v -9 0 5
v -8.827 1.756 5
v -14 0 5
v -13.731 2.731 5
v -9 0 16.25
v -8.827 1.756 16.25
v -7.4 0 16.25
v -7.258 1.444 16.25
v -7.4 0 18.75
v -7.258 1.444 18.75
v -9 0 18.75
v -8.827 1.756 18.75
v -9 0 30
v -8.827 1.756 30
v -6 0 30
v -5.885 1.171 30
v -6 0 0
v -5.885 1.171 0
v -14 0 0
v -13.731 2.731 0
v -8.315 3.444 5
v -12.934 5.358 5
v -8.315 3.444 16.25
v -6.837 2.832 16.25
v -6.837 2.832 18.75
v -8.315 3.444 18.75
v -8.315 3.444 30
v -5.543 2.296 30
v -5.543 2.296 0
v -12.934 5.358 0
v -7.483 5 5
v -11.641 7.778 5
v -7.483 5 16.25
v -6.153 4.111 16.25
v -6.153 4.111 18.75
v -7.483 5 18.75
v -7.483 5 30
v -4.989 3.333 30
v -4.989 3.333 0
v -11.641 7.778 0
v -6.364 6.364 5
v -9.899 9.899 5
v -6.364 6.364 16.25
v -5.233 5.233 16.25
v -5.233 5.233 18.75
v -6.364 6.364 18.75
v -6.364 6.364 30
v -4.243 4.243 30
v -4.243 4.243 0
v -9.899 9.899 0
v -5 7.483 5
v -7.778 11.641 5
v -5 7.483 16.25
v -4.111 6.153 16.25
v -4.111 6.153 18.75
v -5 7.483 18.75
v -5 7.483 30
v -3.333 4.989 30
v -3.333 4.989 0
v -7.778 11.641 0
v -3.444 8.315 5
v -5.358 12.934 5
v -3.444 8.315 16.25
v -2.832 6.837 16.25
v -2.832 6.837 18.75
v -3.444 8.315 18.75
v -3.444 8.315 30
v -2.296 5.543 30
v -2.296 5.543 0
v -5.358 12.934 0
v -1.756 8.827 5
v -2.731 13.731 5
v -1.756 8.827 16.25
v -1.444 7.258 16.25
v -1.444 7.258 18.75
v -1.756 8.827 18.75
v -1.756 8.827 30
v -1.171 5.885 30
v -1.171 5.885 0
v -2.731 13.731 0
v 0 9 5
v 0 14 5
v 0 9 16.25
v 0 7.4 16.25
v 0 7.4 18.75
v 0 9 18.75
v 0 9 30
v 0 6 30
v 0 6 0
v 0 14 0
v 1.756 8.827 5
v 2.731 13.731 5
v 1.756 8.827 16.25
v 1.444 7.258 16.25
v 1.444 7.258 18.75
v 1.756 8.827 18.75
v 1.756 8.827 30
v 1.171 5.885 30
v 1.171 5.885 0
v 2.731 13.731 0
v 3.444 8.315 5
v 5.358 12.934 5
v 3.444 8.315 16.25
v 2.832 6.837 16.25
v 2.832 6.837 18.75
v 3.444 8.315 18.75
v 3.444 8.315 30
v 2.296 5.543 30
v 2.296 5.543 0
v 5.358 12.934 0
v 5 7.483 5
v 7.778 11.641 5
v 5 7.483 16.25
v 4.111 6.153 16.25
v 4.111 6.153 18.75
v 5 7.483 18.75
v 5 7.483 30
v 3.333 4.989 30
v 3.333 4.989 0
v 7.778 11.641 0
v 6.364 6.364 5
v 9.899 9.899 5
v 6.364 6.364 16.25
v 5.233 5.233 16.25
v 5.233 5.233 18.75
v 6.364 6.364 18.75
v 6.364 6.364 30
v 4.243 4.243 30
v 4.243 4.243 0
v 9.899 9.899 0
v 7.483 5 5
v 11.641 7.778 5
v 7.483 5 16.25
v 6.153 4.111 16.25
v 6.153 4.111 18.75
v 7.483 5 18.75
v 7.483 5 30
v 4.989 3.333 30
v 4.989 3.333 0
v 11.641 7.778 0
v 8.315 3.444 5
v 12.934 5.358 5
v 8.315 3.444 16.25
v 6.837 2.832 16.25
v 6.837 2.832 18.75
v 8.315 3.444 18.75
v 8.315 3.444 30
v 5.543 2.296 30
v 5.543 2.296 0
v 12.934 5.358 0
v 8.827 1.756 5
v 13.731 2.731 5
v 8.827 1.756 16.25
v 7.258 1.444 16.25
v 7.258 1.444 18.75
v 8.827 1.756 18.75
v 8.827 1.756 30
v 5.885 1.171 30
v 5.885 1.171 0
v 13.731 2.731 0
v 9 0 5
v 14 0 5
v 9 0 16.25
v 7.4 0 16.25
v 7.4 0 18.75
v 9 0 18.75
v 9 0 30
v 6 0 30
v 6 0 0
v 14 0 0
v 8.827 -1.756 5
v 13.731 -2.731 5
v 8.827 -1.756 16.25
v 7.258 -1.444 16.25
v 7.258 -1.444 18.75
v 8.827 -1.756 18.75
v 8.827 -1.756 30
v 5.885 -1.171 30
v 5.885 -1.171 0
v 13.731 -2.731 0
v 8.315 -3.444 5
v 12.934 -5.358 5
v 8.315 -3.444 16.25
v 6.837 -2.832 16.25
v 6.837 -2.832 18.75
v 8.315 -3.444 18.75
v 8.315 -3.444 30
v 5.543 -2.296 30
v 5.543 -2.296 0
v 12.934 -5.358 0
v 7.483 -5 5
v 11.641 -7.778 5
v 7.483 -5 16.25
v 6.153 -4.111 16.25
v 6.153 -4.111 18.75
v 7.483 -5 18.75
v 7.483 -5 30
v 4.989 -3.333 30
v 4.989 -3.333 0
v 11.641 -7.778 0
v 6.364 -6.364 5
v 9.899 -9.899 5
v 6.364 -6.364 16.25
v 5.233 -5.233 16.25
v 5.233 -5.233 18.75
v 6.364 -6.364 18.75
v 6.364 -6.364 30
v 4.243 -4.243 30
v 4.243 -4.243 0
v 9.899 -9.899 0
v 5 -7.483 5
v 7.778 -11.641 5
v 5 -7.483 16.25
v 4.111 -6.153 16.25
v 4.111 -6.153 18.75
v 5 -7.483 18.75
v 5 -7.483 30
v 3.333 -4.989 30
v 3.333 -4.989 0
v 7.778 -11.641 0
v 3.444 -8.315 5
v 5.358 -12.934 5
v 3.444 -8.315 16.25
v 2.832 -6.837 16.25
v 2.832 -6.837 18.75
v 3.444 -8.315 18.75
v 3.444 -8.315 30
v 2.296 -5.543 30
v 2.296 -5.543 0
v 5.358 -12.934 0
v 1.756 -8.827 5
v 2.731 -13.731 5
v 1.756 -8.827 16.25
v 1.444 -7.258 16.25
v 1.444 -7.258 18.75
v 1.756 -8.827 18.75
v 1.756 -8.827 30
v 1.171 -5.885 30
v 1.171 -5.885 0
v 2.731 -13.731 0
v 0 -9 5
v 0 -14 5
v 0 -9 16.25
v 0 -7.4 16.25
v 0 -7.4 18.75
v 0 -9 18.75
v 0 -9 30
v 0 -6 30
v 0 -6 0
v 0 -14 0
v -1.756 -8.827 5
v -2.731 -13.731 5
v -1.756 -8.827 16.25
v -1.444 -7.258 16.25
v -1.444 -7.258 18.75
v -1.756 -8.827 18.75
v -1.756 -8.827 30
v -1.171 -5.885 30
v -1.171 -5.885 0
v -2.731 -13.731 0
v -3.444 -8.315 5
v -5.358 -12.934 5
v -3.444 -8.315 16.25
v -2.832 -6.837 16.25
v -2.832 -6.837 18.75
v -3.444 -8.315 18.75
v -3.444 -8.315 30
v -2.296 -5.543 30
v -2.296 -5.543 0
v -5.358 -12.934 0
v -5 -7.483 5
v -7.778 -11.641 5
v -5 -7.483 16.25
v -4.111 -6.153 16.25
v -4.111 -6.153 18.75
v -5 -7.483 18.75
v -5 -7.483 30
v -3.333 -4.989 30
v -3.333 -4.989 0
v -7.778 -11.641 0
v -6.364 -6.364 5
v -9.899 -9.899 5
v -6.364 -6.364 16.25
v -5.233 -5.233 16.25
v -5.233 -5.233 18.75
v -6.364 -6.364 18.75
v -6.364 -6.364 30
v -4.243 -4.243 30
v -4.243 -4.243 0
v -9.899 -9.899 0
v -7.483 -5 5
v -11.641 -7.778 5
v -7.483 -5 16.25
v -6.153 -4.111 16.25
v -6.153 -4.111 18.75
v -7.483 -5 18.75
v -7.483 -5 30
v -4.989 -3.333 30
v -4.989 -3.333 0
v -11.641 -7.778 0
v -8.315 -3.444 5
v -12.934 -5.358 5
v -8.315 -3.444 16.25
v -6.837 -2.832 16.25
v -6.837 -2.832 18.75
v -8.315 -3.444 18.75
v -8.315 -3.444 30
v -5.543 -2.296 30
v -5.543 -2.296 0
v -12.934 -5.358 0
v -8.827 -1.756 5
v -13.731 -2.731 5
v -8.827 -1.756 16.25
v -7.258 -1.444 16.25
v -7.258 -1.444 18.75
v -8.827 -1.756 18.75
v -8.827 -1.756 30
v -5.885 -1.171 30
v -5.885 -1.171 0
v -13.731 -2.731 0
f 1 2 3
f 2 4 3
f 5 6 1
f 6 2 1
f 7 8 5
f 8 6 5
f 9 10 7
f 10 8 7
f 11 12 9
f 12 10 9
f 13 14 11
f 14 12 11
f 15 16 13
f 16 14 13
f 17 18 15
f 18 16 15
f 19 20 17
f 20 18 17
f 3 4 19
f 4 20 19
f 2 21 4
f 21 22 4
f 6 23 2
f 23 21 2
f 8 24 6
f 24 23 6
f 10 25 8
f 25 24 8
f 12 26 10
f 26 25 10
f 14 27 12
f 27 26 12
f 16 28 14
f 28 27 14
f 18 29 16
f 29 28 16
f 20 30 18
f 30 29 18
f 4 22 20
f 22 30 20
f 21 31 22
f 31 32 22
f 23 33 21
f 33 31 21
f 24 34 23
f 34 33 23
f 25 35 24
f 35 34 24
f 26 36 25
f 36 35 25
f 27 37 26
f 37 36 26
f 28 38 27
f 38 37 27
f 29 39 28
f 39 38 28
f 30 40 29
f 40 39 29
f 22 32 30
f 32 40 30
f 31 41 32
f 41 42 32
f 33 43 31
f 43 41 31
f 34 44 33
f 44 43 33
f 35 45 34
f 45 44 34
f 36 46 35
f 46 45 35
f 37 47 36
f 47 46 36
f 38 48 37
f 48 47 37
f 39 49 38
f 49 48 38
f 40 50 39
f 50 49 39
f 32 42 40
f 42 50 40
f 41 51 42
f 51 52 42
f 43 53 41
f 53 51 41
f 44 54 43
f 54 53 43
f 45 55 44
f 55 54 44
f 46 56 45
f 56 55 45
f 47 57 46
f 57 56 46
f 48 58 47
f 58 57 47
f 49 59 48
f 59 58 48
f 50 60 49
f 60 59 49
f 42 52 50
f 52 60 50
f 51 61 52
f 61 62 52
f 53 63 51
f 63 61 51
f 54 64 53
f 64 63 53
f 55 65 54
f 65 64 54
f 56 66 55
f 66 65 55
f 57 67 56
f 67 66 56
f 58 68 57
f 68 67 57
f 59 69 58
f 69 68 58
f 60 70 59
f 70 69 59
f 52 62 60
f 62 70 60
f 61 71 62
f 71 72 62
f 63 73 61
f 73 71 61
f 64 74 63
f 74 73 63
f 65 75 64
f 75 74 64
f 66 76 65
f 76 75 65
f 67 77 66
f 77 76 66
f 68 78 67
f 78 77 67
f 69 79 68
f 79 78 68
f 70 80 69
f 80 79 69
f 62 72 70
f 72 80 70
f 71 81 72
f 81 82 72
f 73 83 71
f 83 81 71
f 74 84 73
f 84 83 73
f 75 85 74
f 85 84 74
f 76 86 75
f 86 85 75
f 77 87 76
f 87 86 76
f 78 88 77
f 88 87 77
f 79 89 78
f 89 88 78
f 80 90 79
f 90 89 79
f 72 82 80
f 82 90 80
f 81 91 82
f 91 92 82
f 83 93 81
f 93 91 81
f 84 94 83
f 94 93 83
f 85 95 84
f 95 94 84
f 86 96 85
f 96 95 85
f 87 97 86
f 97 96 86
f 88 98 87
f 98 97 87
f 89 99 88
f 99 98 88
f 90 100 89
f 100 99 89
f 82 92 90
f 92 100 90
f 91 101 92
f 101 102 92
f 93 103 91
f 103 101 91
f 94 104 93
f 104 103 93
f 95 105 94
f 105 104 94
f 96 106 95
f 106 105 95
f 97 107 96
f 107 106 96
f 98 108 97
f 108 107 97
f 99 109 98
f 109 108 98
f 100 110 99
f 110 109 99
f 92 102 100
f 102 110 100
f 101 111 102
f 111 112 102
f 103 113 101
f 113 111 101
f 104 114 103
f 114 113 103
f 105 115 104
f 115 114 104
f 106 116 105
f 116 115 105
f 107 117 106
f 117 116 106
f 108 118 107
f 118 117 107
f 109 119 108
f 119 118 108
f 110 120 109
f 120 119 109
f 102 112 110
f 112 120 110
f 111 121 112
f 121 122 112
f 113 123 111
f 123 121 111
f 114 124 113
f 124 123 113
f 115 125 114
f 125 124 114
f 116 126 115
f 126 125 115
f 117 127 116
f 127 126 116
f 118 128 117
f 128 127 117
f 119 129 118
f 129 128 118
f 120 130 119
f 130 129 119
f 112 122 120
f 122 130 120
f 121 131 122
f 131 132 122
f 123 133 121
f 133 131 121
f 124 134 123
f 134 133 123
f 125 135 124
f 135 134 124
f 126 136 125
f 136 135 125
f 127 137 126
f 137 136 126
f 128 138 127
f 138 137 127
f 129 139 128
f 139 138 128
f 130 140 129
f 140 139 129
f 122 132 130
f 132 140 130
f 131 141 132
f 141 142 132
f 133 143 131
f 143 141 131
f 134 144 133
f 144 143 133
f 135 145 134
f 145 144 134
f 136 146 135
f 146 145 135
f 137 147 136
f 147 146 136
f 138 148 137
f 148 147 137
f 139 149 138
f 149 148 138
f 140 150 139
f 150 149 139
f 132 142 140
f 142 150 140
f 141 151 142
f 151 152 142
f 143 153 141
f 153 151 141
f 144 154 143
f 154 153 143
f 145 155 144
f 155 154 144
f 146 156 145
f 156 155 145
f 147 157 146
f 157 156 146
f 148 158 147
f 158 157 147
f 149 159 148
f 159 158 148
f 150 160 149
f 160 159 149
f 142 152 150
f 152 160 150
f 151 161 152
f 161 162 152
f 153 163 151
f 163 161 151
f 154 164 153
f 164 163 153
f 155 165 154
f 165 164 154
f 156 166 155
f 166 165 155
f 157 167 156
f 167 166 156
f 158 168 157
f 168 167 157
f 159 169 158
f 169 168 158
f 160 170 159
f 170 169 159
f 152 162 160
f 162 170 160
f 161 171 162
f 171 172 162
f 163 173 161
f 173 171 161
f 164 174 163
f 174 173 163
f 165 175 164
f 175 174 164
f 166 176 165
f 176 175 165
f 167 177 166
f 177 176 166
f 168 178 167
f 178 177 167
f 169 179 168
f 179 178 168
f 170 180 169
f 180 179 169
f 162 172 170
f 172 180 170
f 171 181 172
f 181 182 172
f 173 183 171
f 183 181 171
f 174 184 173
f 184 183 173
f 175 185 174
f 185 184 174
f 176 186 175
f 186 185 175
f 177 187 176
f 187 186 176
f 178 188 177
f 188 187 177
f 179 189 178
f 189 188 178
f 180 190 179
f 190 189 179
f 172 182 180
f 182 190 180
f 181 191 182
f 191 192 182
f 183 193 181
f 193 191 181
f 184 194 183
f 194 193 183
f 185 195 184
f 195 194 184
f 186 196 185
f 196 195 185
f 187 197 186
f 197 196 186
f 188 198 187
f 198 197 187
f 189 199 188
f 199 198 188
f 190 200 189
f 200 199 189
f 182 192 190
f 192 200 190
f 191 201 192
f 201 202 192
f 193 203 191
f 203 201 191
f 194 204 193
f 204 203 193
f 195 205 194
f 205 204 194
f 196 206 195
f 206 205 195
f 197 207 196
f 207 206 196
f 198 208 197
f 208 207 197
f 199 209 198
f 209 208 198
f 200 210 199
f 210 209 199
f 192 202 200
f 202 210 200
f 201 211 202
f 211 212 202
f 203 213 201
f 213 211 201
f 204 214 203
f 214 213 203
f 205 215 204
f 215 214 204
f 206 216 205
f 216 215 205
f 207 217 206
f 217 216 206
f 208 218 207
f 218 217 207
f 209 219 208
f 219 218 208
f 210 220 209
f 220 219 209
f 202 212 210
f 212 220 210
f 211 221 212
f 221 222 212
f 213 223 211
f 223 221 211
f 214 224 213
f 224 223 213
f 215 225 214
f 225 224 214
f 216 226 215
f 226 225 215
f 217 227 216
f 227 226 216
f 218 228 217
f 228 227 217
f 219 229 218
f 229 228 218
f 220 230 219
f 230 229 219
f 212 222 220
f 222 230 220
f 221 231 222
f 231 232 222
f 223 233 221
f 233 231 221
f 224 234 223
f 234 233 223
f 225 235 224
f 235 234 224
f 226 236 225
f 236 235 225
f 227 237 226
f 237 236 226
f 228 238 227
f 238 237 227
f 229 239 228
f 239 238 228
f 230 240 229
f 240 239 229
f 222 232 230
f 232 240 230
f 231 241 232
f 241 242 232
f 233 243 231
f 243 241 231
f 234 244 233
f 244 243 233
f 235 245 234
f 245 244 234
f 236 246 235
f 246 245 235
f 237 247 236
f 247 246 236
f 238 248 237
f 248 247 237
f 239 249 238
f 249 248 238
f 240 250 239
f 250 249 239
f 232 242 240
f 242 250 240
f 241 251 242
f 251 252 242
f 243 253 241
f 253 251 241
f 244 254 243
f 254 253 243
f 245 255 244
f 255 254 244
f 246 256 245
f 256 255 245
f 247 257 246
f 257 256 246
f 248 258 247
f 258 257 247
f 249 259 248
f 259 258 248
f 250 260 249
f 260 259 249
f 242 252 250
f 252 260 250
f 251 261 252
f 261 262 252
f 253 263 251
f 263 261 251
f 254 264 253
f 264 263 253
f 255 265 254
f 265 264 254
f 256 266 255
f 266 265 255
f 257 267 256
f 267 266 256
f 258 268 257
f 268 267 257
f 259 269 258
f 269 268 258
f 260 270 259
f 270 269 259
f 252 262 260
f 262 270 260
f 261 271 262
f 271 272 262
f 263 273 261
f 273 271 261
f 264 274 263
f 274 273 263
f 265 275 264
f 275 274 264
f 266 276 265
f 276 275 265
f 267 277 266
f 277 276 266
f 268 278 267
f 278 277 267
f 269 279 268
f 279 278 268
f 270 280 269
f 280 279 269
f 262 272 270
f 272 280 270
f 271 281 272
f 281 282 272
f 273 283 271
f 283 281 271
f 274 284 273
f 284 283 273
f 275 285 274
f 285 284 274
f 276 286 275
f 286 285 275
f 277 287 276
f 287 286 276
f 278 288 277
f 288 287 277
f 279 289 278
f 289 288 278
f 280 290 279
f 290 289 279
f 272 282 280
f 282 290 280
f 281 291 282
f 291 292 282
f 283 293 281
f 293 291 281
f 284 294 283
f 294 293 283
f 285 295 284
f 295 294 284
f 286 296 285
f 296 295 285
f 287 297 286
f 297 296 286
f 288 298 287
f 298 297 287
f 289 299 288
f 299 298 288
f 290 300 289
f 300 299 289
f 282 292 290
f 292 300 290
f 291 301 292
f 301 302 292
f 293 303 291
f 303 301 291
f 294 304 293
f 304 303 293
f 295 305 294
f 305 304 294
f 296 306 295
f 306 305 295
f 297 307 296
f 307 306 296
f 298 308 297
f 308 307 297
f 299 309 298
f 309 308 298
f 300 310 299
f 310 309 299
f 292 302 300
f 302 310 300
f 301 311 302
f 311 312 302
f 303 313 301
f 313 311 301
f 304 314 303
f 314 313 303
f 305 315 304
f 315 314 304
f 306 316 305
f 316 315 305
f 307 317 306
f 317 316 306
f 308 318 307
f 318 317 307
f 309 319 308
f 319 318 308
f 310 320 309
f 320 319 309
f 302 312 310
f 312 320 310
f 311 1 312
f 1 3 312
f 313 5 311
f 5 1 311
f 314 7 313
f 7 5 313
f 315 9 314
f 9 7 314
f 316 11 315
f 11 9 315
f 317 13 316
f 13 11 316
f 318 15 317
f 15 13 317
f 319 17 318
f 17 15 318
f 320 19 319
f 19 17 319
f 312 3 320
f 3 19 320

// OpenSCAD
$fn = 32;

// ----------------------------------------------------------------------
// Grooved revolve: flanged, bore R6
// ----------------------------------------------------------------------

// --- parameters (mm) ---
bore_r = 6;               // bore radius
outer_r = 9;              // outer radius of the body
total_h = 30;             // overall height, Z
wall = 3;                 // radial wall thickness
groove_w = 2.5;           // groove width
groove_d = 1.6;           // groove depth
grooves = 1;              // number of outer grooves
flange_r = 14;            // flange radius
flange_h = 5;             // flange height

bbox_x = 2 * flange_r;  // full diameter
bore_d = 2 * bore_r;  // bore diameter
body_d = 2 * outer_r;  // body diameter
flange_d = 2 * flange_r;  // flange diameter
revolve_angle = 360;  // full turn around the Z axis

profile = [[6, 0], [9, 0], [14, 0], [14, 5], [9, 5], [9, 16.25], [7.4, 16.25], [7.4, 18.75], [9, 18.75], [9, 30], [6, 30]];  // primary outline, 11 points, counter clockwise

// --- the one profile operation ---
rotate_extrude(angle = revolve_angle) polygon(points = profile);
